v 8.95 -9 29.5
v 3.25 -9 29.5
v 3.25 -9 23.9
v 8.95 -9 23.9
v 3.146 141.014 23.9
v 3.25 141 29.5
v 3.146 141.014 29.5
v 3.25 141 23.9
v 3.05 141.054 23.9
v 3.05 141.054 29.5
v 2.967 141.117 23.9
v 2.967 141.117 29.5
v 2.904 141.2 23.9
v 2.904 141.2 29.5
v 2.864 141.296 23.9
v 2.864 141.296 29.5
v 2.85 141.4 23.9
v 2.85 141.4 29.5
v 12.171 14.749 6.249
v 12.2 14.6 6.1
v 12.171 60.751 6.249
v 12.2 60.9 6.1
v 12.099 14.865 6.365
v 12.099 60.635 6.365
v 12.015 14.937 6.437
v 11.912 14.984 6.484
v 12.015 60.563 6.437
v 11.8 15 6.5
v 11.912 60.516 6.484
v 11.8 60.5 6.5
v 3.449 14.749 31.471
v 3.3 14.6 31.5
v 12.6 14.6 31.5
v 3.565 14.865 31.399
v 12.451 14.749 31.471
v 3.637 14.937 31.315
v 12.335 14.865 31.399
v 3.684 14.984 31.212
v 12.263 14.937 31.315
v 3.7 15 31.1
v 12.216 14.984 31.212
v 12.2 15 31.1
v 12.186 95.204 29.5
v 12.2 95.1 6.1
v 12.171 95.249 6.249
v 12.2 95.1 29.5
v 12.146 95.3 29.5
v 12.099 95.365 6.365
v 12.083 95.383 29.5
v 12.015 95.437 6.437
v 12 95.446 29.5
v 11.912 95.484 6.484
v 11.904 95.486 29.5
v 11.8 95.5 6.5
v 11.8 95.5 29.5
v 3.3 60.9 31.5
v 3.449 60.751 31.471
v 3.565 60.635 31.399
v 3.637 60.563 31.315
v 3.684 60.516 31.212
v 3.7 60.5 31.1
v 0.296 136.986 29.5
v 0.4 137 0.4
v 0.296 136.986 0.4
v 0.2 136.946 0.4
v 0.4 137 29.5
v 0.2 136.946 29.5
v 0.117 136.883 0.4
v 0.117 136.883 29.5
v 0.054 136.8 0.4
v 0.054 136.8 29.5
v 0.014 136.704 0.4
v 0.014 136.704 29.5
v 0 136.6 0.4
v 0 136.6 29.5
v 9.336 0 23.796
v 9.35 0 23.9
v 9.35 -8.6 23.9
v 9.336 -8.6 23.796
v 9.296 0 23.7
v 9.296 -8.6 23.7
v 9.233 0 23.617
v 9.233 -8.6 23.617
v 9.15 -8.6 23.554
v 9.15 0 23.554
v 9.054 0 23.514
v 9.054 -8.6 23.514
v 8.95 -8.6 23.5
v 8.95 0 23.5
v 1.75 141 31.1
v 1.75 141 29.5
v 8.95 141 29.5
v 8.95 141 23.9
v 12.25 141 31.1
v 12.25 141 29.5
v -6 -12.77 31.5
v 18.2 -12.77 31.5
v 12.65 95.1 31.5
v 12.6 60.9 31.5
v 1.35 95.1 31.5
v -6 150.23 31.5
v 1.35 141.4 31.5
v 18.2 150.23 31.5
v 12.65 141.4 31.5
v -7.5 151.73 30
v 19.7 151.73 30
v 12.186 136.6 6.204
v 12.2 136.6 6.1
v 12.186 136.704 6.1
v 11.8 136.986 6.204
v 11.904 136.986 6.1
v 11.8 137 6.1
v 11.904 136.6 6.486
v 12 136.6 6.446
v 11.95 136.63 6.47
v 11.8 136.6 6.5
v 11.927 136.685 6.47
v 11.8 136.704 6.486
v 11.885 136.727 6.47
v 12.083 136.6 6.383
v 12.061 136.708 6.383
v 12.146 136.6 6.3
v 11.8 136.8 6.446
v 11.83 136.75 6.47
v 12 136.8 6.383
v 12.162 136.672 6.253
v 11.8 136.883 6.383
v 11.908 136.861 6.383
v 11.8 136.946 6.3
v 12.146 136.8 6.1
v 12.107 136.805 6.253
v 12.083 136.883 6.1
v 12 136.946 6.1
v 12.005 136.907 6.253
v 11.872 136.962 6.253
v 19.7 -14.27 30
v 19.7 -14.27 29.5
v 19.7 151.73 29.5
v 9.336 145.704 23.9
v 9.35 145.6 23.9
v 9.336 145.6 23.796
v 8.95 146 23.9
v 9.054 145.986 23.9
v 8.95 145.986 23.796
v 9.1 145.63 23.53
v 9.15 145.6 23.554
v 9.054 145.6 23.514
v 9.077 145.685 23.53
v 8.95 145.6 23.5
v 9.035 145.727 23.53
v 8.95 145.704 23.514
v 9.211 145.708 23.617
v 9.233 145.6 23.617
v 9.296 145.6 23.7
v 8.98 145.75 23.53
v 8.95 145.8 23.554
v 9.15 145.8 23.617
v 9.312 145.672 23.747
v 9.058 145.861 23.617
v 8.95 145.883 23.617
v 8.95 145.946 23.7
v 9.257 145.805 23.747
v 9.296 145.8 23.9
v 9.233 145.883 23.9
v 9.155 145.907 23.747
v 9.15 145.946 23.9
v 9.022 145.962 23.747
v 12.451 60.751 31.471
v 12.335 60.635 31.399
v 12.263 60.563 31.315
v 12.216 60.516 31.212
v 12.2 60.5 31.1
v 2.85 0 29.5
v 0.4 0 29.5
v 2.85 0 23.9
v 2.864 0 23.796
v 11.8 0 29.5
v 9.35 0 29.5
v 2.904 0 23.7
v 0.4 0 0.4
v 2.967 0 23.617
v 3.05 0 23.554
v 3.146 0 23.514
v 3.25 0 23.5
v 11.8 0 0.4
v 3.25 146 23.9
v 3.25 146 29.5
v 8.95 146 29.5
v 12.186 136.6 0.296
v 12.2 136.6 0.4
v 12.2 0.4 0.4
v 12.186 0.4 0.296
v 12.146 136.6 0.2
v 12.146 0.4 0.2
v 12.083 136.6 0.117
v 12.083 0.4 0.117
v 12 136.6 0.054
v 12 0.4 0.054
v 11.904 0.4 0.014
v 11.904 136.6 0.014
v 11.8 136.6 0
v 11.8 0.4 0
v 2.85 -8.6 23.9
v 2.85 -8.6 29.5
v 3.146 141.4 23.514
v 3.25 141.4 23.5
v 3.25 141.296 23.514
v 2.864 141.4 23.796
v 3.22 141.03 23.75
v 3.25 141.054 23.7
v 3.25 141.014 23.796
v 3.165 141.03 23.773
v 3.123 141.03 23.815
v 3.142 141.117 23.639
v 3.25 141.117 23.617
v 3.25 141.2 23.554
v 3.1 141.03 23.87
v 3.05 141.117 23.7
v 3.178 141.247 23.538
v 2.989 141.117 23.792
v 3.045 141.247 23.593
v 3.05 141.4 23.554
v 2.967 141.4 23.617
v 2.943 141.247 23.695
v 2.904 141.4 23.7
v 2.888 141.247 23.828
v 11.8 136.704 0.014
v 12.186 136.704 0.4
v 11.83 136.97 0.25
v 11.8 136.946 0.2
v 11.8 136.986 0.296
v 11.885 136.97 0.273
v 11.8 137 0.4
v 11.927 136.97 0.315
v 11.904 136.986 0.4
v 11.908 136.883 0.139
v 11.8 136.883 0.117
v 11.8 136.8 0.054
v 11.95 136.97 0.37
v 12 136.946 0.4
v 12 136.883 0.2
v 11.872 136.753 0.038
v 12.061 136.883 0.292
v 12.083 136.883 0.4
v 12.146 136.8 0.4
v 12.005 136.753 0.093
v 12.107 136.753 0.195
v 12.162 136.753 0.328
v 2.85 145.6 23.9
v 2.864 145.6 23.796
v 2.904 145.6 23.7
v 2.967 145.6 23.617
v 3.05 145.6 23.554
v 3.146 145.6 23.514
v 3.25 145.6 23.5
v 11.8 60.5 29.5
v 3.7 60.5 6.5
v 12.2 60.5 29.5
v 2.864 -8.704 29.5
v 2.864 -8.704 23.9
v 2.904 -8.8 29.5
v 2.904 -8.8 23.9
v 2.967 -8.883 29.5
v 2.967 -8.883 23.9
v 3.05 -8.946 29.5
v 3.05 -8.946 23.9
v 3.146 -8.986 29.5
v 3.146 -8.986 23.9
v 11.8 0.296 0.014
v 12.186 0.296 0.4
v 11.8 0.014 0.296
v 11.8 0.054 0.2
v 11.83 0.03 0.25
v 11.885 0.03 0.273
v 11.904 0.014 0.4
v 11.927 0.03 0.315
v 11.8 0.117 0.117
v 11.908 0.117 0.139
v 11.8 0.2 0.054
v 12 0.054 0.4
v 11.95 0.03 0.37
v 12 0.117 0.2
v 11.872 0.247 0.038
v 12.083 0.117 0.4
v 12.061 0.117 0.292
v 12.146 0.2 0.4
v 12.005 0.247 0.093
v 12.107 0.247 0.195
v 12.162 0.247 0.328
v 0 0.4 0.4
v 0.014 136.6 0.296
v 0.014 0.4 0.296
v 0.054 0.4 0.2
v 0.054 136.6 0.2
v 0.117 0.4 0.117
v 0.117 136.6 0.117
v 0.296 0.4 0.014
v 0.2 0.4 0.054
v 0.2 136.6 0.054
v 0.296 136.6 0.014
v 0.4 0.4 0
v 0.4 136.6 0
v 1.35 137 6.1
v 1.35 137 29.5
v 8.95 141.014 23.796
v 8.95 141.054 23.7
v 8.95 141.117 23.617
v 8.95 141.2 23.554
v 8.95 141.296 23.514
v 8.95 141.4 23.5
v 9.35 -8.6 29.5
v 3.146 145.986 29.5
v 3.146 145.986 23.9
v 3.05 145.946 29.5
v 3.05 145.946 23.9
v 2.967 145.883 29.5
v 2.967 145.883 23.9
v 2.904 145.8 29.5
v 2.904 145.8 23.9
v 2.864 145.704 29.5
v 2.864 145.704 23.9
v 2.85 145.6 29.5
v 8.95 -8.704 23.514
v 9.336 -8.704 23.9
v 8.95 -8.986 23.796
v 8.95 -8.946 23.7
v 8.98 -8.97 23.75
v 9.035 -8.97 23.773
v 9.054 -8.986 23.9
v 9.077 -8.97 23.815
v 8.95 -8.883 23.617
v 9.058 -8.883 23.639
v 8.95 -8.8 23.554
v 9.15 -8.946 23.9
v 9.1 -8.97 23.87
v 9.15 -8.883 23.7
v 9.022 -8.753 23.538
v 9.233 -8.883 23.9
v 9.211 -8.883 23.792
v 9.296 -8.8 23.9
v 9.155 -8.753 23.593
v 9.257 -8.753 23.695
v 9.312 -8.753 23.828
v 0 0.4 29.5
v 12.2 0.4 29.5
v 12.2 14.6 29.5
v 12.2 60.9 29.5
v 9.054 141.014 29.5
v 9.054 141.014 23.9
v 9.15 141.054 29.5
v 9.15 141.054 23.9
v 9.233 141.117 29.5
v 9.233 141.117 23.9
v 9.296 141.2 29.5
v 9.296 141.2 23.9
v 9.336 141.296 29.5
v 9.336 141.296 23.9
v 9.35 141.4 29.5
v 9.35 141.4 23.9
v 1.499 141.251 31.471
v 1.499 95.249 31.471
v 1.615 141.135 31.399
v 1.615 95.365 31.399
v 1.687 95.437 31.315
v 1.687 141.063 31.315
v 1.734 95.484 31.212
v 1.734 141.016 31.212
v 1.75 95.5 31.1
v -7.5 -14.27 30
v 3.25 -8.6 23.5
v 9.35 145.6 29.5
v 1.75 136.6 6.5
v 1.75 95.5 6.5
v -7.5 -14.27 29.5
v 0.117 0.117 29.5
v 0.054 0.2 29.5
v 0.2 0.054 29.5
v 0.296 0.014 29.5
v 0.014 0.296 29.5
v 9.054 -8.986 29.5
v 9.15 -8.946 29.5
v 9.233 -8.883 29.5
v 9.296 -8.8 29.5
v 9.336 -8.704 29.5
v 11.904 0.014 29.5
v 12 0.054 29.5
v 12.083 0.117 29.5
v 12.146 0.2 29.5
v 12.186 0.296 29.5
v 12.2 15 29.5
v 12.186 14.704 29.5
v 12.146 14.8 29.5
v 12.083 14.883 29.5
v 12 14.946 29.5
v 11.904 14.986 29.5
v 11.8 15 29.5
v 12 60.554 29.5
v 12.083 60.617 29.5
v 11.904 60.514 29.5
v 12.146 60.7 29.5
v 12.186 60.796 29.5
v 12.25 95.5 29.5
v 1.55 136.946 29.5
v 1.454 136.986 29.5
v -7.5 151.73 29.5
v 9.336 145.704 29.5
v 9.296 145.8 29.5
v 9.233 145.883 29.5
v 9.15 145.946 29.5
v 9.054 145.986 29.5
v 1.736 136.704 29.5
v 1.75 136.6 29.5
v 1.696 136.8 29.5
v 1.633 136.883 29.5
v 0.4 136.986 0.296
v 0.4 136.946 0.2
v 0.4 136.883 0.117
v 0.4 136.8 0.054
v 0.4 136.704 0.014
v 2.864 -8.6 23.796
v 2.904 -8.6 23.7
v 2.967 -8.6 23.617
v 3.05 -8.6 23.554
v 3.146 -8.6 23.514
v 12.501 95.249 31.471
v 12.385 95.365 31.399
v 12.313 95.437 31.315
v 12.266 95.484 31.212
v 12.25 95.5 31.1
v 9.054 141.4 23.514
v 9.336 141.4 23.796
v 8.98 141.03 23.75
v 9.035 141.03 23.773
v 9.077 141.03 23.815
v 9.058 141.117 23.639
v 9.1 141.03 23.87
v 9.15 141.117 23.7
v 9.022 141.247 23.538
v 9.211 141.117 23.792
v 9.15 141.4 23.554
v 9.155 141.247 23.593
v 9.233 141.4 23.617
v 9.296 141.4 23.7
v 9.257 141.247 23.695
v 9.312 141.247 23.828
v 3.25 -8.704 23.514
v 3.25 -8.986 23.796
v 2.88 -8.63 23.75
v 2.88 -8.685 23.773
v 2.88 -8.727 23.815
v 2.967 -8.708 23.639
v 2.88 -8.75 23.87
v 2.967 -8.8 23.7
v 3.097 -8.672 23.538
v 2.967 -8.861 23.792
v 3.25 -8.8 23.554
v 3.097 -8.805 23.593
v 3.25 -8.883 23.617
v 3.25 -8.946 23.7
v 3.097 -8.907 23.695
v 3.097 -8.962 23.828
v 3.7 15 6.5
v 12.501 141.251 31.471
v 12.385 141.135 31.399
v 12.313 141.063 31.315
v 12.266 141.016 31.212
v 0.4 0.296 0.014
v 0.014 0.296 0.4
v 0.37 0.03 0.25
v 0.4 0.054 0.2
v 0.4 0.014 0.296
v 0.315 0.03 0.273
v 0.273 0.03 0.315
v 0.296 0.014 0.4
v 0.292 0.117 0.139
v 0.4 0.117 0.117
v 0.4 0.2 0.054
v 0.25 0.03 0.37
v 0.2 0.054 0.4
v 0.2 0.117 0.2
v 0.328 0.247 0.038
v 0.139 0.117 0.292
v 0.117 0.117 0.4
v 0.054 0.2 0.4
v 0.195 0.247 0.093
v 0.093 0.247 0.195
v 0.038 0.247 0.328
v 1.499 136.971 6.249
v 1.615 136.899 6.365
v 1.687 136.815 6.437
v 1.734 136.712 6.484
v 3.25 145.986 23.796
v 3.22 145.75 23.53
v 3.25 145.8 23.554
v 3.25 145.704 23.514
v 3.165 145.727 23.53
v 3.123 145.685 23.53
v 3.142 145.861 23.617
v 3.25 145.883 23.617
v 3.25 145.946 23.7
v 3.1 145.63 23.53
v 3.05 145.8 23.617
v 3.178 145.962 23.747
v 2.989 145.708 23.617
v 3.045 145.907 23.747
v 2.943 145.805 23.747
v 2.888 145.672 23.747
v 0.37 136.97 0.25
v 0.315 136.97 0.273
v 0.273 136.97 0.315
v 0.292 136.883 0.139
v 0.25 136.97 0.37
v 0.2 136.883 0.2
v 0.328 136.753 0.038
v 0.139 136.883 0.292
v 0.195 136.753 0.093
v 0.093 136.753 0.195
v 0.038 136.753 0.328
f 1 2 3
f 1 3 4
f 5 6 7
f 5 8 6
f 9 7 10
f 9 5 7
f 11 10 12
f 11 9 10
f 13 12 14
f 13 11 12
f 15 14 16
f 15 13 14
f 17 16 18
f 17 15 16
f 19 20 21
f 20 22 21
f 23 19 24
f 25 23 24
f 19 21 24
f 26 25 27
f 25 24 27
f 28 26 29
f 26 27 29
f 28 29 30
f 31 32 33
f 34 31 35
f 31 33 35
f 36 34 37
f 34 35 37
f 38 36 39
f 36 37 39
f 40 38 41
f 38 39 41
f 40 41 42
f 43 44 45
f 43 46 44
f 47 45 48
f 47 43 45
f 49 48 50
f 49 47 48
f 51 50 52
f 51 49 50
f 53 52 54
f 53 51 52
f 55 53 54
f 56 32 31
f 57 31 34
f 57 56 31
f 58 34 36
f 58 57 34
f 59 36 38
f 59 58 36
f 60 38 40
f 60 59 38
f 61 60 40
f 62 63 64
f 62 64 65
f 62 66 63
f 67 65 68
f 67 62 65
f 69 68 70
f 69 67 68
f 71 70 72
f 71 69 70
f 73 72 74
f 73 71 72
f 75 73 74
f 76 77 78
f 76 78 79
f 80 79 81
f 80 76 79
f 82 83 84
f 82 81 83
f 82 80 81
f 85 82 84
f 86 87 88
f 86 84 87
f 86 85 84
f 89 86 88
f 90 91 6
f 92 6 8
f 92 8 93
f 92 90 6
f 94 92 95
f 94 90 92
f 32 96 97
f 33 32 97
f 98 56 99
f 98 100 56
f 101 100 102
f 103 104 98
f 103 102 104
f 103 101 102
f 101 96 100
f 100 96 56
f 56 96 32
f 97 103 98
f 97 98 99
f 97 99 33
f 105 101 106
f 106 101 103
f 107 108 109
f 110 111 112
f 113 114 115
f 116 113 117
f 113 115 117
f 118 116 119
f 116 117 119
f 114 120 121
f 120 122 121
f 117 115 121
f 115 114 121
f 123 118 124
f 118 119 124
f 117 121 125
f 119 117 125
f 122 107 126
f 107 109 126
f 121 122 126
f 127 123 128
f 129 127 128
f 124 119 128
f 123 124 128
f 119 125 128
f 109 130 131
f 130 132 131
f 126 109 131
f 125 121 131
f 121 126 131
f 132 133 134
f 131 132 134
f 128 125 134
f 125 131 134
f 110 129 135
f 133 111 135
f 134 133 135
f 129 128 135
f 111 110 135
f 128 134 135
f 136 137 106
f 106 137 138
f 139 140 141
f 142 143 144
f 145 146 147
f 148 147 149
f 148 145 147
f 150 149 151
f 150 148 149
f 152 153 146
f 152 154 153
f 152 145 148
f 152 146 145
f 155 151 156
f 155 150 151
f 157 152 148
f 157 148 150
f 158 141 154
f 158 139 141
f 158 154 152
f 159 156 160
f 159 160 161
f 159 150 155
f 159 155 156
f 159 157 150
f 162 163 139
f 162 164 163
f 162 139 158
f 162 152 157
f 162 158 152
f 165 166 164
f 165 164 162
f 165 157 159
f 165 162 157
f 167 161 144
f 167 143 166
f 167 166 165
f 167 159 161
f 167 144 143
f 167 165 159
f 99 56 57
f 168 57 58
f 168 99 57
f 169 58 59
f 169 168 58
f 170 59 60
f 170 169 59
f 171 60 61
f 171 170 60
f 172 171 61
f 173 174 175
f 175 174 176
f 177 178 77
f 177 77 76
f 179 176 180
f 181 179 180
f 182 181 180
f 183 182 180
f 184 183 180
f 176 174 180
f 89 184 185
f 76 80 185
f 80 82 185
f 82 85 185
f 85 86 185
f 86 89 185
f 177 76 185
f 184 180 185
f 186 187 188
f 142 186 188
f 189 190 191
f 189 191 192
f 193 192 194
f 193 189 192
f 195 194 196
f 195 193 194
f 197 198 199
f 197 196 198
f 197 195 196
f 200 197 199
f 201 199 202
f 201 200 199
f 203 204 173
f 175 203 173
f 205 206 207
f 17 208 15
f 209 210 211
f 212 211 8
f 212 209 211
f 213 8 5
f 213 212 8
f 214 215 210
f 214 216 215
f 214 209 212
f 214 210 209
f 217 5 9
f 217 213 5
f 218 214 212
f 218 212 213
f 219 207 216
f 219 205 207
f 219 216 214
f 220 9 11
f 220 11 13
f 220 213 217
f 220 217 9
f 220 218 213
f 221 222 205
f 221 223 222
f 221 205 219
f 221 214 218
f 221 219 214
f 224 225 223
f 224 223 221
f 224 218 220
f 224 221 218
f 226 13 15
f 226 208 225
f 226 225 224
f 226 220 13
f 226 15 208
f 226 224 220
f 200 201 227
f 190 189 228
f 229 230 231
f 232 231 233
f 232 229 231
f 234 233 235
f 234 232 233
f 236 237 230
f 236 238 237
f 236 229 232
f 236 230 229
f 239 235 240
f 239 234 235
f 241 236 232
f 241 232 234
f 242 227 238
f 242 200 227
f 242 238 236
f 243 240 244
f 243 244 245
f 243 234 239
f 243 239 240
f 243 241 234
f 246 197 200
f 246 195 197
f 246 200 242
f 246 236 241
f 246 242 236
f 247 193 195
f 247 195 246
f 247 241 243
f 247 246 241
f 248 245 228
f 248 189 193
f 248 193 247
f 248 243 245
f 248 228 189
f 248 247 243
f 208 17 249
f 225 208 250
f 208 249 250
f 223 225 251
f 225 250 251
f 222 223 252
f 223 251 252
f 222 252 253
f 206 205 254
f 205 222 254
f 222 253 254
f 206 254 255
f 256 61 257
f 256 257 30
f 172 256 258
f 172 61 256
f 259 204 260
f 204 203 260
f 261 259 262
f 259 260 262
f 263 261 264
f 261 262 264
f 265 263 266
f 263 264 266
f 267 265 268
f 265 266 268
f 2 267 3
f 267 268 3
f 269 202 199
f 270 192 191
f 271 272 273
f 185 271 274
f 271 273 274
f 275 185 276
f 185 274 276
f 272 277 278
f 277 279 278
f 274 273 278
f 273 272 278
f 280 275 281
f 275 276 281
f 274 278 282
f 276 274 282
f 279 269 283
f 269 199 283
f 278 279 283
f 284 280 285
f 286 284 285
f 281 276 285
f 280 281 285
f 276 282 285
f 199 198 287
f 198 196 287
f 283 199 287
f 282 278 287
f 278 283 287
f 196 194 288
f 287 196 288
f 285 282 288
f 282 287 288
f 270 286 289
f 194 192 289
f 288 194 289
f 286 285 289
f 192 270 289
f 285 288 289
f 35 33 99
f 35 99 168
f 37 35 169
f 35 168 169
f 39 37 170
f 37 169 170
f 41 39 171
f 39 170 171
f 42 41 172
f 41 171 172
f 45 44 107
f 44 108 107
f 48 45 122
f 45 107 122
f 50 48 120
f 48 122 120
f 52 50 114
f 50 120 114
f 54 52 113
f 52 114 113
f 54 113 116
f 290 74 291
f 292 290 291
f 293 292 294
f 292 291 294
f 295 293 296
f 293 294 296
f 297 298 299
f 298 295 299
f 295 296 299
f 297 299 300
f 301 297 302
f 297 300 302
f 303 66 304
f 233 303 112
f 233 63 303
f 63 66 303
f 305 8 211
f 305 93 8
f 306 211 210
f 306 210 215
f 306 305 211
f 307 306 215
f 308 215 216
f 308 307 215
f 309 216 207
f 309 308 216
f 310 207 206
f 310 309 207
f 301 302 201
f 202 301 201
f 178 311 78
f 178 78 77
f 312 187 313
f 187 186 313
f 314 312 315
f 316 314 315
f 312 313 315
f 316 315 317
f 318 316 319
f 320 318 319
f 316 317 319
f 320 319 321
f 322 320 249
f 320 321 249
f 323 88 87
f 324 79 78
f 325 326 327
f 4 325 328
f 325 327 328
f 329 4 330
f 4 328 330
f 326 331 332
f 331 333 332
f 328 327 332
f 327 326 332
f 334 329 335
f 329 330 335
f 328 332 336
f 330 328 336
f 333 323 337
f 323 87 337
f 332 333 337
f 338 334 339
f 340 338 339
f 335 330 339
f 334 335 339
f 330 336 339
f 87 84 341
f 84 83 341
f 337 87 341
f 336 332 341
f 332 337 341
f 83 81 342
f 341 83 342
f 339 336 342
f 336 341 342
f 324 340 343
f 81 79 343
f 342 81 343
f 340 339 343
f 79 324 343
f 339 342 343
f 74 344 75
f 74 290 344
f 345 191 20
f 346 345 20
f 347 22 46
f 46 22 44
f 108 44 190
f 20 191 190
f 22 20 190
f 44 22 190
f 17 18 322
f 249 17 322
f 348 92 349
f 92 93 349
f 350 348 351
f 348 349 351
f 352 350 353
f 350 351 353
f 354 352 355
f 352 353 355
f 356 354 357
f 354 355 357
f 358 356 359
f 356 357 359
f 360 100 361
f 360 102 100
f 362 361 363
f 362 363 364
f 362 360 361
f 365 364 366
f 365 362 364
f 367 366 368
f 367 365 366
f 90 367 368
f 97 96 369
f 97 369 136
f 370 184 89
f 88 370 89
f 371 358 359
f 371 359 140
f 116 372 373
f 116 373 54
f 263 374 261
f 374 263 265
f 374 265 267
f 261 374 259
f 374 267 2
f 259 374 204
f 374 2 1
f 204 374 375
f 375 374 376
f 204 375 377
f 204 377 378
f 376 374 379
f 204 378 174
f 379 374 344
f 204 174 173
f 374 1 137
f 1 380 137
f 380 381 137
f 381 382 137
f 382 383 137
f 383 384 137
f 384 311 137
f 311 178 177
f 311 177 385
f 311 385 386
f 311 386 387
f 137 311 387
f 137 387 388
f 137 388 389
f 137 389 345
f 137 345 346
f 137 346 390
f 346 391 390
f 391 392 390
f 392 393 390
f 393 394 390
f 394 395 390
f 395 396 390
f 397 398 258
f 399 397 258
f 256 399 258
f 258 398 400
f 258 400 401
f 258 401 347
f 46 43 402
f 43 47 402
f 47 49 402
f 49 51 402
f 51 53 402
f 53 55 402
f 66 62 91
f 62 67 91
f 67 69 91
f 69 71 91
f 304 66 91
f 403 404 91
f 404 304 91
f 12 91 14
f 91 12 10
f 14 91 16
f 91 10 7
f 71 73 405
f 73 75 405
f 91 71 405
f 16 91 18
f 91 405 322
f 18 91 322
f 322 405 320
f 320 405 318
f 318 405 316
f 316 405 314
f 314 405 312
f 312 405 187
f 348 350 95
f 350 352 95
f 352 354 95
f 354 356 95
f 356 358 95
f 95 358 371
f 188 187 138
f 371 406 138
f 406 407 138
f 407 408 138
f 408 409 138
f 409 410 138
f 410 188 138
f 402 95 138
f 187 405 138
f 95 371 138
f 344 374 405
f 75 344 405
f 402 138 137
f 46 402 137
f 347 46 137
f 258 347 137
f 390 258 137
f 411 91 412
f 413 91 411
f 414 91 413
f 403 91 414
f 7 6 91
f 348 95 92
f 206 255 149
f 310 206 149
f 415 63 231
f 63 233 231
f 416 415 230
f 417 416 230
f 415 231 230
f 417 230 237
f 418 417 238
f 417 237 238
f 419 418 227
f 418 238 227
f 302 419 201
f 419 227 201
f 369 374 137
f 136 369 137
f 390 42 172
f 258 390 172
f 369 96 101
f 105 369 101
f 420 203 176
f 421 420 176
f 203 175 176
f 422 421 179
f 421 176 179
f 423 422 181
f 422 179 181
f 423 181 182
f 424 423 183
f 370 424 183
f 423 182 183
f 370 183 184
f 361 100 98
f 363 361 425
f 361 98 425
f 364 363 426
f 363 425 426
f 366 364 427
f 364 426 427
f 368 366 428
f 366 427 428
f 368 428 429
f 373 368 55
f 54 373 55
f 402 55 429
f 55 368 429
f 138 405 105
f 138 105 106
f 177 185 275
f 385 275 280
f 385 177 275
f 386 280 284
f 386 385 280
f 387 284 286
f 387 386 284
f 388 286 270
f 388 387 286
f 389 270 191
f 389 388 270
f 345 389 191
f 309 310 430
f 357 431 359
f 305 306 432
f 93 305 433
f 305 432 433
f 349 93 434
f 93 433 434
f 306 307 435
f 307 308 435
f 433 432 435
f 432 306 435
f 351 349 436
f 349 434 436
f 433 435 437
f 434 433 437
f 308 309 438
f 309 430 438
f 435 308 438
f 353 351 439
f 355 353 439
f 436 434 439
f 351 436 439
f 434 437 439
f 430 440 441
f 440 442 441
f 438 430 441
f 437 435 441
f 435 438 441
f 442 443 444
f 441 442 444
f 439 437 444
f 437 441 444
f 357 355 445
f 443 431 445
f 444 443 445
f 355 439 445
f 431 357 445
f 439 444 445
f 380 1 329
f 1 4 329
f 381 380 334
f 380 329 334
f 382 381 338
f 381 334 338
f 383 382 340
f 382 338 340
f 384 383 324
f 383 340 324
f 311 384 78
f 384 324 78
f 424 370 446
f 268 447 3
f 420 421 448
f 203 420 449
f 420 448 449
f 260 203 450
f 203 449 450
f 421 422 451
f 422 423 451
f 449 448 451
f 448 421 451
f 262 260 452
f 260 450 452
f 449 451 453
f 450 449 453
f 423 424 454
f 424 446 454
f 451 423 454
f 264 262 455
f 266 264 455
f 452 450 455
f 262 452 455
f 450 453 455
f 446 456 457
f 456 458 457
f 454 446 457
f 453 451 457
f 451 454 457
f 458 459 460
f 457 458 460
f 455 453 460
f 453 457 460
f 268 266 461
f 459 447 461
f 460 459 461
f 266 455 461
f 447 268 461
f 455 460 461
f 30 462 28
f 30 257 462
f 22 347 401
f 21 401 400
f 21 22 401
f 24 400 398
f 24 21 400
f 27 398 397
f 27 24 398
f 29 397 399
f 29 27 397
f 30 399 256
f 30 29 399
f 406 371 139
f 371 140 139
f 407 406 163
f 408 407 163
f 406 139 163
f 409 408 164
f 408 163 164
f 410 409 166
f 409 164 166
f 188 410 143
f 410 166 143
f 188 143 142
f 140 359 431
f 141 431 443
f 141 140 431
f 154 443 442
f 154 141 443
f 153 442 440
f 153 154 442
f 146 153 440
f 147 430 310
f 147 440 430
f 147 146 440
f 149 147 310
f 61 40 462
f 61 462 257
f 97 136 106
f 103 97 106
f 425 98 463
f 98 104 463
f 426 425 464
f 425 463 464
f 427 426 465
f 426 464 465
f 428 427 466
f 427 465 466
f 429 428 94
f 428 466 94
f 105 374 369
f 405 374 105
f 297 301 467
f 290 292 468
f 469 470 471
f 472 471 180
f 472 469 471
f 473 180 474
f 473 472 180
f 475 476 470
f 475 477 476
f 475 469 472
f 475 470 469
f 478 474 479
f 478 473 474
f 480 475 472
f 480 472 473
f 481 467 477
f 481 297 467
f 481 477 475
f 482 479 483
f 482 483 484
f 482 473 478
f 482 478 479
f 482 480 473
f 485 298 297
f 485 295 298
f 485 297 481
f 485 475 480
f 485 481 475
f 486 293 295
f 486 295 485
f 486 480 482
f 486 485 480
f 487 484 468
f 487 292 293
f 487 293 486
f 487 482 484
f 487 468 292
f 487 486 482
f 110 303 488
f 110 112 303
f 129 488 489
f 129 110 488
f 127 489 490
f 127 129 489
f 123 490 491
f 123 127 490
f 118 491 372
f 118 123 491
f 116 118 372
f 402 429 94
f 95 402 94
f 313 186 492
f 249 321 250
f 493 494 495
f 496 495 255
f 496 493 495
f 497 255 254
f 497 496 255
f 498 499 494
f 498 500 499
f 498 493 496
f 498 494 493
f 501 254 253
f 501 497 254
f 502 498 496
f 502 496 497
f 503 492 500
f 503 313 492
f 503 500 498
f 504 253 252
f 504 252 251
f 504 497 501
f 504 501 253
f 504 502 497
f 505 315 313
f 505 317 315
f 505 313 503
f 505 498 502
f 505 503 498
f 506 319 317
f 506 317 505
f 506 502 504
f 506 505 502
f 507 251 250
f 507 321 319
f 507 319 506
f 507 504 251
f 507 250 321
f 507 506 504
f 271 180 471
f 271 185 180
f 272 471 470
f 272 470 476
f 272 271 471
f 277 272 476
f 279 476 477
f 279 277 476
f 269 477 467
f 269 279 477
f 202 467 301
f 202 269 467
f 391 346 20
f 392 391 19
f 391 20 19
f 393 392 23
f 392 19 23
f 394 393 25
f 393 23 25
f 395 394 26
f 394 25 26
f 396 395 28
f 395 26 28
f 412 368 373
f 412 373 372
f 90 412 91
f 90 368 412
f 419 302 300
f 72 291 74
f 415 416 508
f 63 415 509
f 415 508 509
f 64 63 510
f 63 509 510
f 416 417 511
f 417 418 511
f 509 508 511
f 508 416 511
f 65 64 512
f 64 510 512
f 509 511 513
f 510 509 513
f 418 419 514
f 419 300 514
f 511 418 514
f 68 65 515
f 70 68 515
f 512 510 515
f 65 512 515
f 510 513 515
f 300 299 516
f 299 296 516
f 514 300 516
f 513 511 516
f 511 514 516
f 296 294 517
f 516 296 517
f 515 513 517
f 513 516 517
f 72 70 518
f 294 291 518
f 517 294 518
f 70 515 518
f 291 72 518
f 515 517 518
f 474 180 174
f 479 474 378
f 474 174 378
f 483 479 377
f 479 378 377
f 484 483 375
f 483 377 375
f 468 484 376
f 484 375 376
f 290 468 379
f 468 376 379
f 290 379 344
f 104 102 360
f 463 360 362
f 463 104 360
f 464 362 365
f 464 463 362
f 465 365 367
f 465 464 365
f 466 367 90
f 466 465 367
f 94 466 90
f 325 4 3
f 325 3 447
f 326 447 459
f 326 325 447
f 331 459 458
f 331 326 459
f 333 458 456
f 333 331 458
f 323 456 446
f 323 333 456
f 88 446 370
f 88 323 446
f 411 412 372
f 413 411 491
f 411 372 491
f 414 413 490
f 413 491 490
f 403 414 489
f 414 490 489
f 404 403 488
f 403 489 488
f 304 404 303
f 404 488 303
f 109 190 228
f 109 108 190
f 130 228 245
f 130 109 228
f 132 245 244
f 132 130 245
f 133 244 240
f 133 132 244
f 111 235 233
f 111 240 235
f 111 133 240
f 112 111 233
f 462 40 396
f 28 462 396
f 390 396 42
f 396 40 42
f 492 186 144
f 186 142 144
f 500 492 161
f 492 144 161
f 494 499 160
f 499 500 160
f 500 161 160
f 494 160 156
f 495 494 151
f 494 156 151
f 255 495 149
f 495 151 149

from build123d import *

# Parameters (mm, degrees)
SKETCH_W      = 12.2
SKETCH_H      = 137
PAD_DEPTH     = 29.5
SKETCH002_W   = 27.2
SKETCH002_H   = 166
PAD001_DEPTH  = 2
SKETCH003_W   = 6.5
SKETCH003_H   = 9
PAD002_DEPTH  = 6
SKETCH001_W   = 8.5
SKETCH001_H   = 45.5
SKETCH001_W_2 = 10.5
POCKET_DEPTH  = 25
CHAMFER_SIZE  = 1.5
FILLET_R      = 0.4


with BuildPart() as part:
    # Sketch → Pad (new body)
    with BuildSketch(Plane.XY):
        with Locations((6.1, 68.5)):
            Rectangle(SKETCH_W, SKETCH_H)
    extrude(amount=PAD_DEPTH)

    # Sketch002 → Pad001 (join)
    with BuildSketch(Plane.XY.offset(29.5)):
        with Locations((6.1, 68.73)):
            Rectangle(SKETCH002_W, SKETCH002_H)
    extrude(amount=PAD001_DEPTH)

    # Sketch003 → Pad002 (join)
    with BuildSketch(Plane.XY.offset(29.5)):
        with Locations((6.1, -4.5)):
            Rectangle(SKETCH003_W, SKETCH003_H)
        with Locations((6.1, 141.5)):
            Rectangle(SKETCH003_W, SKETCH003_H)
    extrude(amount=-PAD002_DEPTH)

    # Sketch001 → Pocket (cut)
    with BuildSketch(Plane.XY.offset(31.5)):
        with Locations((7.95, 37.75)):
            Rectangle(SKETCH001_W, SKETCH001_H)
        with Locations((7, 118.25)):
            Rectangle(SKETCH001_W_2, SKETCH001_H)
    extrude(amount=-POCKET_DEPTH, mode=Mode.SUBTRACT)

    # Chamfer
    chamfer_edges = [part.edges().sort_by_distance(p)[0] for p in [
        (6.1, 151.73, 31.5),
        (-7.5, 68.73, 31.5),
        (19.7, 68.73, 31.5),
        (6.1, -14.27, 31.5),
    ]]
    chamfer(chamfer_edges, length=CHAMFER_SIZE)

    # Fillet
    fillet_edges = [part.edges().sort_by_distance(p)[0] for p in [
        (3.7, 37.75, 31.5),
        (7.95, 60.5, 31.5),
        (12.2, 37.75, 31.5),
        (7.95, 15, 31.5),
        (12.25, 118.25, 31.5),
        (7, 95.5, 31.5),
        (1.75, 118.25, 31.5),
        (7, 141, 31.5),
        (12.2, 68.5, 0),
        (0, 68.5, 0),
        (6.1, 137, 0),
        (6.1, 0, 0),
        (12.2, 137, 3.25),
        (0, 137, 14.75),
        (0, 0, 14.75),
        (12.2, 0, 14.75),
        (9.35, -4.5, 23.5),
        (6.1, -9, 23.5),
        (2.85, -4.5, 23.5),
        (2.85, -9, 26.5),
        (9.35, -9, 26.5),
        (12.2, 15, 18),
        (12.2, 37.75, 6.5),
        (12.2, 60.5, 18),
        (12.2, 95.5, 18),
        (12.2, 116.25, 6.5),
        (6.975, 137, 6.5),
        (2.85, 146, 26.5),
        (9.35, 146, 26.5),
        (9.35, 143.5, 23.5),
        (6.1, 146, 23.5),
        (2.85, 143.5, 23.5),
        (6.1, 141, 23.5),
        (9.35, 141, 26.5),
        (2.85, 141, 26.5),
        (1.75, 137, 18),
    ]]
    fillet(fillet_edges, radius=FILLET_R)


solid = part.part
